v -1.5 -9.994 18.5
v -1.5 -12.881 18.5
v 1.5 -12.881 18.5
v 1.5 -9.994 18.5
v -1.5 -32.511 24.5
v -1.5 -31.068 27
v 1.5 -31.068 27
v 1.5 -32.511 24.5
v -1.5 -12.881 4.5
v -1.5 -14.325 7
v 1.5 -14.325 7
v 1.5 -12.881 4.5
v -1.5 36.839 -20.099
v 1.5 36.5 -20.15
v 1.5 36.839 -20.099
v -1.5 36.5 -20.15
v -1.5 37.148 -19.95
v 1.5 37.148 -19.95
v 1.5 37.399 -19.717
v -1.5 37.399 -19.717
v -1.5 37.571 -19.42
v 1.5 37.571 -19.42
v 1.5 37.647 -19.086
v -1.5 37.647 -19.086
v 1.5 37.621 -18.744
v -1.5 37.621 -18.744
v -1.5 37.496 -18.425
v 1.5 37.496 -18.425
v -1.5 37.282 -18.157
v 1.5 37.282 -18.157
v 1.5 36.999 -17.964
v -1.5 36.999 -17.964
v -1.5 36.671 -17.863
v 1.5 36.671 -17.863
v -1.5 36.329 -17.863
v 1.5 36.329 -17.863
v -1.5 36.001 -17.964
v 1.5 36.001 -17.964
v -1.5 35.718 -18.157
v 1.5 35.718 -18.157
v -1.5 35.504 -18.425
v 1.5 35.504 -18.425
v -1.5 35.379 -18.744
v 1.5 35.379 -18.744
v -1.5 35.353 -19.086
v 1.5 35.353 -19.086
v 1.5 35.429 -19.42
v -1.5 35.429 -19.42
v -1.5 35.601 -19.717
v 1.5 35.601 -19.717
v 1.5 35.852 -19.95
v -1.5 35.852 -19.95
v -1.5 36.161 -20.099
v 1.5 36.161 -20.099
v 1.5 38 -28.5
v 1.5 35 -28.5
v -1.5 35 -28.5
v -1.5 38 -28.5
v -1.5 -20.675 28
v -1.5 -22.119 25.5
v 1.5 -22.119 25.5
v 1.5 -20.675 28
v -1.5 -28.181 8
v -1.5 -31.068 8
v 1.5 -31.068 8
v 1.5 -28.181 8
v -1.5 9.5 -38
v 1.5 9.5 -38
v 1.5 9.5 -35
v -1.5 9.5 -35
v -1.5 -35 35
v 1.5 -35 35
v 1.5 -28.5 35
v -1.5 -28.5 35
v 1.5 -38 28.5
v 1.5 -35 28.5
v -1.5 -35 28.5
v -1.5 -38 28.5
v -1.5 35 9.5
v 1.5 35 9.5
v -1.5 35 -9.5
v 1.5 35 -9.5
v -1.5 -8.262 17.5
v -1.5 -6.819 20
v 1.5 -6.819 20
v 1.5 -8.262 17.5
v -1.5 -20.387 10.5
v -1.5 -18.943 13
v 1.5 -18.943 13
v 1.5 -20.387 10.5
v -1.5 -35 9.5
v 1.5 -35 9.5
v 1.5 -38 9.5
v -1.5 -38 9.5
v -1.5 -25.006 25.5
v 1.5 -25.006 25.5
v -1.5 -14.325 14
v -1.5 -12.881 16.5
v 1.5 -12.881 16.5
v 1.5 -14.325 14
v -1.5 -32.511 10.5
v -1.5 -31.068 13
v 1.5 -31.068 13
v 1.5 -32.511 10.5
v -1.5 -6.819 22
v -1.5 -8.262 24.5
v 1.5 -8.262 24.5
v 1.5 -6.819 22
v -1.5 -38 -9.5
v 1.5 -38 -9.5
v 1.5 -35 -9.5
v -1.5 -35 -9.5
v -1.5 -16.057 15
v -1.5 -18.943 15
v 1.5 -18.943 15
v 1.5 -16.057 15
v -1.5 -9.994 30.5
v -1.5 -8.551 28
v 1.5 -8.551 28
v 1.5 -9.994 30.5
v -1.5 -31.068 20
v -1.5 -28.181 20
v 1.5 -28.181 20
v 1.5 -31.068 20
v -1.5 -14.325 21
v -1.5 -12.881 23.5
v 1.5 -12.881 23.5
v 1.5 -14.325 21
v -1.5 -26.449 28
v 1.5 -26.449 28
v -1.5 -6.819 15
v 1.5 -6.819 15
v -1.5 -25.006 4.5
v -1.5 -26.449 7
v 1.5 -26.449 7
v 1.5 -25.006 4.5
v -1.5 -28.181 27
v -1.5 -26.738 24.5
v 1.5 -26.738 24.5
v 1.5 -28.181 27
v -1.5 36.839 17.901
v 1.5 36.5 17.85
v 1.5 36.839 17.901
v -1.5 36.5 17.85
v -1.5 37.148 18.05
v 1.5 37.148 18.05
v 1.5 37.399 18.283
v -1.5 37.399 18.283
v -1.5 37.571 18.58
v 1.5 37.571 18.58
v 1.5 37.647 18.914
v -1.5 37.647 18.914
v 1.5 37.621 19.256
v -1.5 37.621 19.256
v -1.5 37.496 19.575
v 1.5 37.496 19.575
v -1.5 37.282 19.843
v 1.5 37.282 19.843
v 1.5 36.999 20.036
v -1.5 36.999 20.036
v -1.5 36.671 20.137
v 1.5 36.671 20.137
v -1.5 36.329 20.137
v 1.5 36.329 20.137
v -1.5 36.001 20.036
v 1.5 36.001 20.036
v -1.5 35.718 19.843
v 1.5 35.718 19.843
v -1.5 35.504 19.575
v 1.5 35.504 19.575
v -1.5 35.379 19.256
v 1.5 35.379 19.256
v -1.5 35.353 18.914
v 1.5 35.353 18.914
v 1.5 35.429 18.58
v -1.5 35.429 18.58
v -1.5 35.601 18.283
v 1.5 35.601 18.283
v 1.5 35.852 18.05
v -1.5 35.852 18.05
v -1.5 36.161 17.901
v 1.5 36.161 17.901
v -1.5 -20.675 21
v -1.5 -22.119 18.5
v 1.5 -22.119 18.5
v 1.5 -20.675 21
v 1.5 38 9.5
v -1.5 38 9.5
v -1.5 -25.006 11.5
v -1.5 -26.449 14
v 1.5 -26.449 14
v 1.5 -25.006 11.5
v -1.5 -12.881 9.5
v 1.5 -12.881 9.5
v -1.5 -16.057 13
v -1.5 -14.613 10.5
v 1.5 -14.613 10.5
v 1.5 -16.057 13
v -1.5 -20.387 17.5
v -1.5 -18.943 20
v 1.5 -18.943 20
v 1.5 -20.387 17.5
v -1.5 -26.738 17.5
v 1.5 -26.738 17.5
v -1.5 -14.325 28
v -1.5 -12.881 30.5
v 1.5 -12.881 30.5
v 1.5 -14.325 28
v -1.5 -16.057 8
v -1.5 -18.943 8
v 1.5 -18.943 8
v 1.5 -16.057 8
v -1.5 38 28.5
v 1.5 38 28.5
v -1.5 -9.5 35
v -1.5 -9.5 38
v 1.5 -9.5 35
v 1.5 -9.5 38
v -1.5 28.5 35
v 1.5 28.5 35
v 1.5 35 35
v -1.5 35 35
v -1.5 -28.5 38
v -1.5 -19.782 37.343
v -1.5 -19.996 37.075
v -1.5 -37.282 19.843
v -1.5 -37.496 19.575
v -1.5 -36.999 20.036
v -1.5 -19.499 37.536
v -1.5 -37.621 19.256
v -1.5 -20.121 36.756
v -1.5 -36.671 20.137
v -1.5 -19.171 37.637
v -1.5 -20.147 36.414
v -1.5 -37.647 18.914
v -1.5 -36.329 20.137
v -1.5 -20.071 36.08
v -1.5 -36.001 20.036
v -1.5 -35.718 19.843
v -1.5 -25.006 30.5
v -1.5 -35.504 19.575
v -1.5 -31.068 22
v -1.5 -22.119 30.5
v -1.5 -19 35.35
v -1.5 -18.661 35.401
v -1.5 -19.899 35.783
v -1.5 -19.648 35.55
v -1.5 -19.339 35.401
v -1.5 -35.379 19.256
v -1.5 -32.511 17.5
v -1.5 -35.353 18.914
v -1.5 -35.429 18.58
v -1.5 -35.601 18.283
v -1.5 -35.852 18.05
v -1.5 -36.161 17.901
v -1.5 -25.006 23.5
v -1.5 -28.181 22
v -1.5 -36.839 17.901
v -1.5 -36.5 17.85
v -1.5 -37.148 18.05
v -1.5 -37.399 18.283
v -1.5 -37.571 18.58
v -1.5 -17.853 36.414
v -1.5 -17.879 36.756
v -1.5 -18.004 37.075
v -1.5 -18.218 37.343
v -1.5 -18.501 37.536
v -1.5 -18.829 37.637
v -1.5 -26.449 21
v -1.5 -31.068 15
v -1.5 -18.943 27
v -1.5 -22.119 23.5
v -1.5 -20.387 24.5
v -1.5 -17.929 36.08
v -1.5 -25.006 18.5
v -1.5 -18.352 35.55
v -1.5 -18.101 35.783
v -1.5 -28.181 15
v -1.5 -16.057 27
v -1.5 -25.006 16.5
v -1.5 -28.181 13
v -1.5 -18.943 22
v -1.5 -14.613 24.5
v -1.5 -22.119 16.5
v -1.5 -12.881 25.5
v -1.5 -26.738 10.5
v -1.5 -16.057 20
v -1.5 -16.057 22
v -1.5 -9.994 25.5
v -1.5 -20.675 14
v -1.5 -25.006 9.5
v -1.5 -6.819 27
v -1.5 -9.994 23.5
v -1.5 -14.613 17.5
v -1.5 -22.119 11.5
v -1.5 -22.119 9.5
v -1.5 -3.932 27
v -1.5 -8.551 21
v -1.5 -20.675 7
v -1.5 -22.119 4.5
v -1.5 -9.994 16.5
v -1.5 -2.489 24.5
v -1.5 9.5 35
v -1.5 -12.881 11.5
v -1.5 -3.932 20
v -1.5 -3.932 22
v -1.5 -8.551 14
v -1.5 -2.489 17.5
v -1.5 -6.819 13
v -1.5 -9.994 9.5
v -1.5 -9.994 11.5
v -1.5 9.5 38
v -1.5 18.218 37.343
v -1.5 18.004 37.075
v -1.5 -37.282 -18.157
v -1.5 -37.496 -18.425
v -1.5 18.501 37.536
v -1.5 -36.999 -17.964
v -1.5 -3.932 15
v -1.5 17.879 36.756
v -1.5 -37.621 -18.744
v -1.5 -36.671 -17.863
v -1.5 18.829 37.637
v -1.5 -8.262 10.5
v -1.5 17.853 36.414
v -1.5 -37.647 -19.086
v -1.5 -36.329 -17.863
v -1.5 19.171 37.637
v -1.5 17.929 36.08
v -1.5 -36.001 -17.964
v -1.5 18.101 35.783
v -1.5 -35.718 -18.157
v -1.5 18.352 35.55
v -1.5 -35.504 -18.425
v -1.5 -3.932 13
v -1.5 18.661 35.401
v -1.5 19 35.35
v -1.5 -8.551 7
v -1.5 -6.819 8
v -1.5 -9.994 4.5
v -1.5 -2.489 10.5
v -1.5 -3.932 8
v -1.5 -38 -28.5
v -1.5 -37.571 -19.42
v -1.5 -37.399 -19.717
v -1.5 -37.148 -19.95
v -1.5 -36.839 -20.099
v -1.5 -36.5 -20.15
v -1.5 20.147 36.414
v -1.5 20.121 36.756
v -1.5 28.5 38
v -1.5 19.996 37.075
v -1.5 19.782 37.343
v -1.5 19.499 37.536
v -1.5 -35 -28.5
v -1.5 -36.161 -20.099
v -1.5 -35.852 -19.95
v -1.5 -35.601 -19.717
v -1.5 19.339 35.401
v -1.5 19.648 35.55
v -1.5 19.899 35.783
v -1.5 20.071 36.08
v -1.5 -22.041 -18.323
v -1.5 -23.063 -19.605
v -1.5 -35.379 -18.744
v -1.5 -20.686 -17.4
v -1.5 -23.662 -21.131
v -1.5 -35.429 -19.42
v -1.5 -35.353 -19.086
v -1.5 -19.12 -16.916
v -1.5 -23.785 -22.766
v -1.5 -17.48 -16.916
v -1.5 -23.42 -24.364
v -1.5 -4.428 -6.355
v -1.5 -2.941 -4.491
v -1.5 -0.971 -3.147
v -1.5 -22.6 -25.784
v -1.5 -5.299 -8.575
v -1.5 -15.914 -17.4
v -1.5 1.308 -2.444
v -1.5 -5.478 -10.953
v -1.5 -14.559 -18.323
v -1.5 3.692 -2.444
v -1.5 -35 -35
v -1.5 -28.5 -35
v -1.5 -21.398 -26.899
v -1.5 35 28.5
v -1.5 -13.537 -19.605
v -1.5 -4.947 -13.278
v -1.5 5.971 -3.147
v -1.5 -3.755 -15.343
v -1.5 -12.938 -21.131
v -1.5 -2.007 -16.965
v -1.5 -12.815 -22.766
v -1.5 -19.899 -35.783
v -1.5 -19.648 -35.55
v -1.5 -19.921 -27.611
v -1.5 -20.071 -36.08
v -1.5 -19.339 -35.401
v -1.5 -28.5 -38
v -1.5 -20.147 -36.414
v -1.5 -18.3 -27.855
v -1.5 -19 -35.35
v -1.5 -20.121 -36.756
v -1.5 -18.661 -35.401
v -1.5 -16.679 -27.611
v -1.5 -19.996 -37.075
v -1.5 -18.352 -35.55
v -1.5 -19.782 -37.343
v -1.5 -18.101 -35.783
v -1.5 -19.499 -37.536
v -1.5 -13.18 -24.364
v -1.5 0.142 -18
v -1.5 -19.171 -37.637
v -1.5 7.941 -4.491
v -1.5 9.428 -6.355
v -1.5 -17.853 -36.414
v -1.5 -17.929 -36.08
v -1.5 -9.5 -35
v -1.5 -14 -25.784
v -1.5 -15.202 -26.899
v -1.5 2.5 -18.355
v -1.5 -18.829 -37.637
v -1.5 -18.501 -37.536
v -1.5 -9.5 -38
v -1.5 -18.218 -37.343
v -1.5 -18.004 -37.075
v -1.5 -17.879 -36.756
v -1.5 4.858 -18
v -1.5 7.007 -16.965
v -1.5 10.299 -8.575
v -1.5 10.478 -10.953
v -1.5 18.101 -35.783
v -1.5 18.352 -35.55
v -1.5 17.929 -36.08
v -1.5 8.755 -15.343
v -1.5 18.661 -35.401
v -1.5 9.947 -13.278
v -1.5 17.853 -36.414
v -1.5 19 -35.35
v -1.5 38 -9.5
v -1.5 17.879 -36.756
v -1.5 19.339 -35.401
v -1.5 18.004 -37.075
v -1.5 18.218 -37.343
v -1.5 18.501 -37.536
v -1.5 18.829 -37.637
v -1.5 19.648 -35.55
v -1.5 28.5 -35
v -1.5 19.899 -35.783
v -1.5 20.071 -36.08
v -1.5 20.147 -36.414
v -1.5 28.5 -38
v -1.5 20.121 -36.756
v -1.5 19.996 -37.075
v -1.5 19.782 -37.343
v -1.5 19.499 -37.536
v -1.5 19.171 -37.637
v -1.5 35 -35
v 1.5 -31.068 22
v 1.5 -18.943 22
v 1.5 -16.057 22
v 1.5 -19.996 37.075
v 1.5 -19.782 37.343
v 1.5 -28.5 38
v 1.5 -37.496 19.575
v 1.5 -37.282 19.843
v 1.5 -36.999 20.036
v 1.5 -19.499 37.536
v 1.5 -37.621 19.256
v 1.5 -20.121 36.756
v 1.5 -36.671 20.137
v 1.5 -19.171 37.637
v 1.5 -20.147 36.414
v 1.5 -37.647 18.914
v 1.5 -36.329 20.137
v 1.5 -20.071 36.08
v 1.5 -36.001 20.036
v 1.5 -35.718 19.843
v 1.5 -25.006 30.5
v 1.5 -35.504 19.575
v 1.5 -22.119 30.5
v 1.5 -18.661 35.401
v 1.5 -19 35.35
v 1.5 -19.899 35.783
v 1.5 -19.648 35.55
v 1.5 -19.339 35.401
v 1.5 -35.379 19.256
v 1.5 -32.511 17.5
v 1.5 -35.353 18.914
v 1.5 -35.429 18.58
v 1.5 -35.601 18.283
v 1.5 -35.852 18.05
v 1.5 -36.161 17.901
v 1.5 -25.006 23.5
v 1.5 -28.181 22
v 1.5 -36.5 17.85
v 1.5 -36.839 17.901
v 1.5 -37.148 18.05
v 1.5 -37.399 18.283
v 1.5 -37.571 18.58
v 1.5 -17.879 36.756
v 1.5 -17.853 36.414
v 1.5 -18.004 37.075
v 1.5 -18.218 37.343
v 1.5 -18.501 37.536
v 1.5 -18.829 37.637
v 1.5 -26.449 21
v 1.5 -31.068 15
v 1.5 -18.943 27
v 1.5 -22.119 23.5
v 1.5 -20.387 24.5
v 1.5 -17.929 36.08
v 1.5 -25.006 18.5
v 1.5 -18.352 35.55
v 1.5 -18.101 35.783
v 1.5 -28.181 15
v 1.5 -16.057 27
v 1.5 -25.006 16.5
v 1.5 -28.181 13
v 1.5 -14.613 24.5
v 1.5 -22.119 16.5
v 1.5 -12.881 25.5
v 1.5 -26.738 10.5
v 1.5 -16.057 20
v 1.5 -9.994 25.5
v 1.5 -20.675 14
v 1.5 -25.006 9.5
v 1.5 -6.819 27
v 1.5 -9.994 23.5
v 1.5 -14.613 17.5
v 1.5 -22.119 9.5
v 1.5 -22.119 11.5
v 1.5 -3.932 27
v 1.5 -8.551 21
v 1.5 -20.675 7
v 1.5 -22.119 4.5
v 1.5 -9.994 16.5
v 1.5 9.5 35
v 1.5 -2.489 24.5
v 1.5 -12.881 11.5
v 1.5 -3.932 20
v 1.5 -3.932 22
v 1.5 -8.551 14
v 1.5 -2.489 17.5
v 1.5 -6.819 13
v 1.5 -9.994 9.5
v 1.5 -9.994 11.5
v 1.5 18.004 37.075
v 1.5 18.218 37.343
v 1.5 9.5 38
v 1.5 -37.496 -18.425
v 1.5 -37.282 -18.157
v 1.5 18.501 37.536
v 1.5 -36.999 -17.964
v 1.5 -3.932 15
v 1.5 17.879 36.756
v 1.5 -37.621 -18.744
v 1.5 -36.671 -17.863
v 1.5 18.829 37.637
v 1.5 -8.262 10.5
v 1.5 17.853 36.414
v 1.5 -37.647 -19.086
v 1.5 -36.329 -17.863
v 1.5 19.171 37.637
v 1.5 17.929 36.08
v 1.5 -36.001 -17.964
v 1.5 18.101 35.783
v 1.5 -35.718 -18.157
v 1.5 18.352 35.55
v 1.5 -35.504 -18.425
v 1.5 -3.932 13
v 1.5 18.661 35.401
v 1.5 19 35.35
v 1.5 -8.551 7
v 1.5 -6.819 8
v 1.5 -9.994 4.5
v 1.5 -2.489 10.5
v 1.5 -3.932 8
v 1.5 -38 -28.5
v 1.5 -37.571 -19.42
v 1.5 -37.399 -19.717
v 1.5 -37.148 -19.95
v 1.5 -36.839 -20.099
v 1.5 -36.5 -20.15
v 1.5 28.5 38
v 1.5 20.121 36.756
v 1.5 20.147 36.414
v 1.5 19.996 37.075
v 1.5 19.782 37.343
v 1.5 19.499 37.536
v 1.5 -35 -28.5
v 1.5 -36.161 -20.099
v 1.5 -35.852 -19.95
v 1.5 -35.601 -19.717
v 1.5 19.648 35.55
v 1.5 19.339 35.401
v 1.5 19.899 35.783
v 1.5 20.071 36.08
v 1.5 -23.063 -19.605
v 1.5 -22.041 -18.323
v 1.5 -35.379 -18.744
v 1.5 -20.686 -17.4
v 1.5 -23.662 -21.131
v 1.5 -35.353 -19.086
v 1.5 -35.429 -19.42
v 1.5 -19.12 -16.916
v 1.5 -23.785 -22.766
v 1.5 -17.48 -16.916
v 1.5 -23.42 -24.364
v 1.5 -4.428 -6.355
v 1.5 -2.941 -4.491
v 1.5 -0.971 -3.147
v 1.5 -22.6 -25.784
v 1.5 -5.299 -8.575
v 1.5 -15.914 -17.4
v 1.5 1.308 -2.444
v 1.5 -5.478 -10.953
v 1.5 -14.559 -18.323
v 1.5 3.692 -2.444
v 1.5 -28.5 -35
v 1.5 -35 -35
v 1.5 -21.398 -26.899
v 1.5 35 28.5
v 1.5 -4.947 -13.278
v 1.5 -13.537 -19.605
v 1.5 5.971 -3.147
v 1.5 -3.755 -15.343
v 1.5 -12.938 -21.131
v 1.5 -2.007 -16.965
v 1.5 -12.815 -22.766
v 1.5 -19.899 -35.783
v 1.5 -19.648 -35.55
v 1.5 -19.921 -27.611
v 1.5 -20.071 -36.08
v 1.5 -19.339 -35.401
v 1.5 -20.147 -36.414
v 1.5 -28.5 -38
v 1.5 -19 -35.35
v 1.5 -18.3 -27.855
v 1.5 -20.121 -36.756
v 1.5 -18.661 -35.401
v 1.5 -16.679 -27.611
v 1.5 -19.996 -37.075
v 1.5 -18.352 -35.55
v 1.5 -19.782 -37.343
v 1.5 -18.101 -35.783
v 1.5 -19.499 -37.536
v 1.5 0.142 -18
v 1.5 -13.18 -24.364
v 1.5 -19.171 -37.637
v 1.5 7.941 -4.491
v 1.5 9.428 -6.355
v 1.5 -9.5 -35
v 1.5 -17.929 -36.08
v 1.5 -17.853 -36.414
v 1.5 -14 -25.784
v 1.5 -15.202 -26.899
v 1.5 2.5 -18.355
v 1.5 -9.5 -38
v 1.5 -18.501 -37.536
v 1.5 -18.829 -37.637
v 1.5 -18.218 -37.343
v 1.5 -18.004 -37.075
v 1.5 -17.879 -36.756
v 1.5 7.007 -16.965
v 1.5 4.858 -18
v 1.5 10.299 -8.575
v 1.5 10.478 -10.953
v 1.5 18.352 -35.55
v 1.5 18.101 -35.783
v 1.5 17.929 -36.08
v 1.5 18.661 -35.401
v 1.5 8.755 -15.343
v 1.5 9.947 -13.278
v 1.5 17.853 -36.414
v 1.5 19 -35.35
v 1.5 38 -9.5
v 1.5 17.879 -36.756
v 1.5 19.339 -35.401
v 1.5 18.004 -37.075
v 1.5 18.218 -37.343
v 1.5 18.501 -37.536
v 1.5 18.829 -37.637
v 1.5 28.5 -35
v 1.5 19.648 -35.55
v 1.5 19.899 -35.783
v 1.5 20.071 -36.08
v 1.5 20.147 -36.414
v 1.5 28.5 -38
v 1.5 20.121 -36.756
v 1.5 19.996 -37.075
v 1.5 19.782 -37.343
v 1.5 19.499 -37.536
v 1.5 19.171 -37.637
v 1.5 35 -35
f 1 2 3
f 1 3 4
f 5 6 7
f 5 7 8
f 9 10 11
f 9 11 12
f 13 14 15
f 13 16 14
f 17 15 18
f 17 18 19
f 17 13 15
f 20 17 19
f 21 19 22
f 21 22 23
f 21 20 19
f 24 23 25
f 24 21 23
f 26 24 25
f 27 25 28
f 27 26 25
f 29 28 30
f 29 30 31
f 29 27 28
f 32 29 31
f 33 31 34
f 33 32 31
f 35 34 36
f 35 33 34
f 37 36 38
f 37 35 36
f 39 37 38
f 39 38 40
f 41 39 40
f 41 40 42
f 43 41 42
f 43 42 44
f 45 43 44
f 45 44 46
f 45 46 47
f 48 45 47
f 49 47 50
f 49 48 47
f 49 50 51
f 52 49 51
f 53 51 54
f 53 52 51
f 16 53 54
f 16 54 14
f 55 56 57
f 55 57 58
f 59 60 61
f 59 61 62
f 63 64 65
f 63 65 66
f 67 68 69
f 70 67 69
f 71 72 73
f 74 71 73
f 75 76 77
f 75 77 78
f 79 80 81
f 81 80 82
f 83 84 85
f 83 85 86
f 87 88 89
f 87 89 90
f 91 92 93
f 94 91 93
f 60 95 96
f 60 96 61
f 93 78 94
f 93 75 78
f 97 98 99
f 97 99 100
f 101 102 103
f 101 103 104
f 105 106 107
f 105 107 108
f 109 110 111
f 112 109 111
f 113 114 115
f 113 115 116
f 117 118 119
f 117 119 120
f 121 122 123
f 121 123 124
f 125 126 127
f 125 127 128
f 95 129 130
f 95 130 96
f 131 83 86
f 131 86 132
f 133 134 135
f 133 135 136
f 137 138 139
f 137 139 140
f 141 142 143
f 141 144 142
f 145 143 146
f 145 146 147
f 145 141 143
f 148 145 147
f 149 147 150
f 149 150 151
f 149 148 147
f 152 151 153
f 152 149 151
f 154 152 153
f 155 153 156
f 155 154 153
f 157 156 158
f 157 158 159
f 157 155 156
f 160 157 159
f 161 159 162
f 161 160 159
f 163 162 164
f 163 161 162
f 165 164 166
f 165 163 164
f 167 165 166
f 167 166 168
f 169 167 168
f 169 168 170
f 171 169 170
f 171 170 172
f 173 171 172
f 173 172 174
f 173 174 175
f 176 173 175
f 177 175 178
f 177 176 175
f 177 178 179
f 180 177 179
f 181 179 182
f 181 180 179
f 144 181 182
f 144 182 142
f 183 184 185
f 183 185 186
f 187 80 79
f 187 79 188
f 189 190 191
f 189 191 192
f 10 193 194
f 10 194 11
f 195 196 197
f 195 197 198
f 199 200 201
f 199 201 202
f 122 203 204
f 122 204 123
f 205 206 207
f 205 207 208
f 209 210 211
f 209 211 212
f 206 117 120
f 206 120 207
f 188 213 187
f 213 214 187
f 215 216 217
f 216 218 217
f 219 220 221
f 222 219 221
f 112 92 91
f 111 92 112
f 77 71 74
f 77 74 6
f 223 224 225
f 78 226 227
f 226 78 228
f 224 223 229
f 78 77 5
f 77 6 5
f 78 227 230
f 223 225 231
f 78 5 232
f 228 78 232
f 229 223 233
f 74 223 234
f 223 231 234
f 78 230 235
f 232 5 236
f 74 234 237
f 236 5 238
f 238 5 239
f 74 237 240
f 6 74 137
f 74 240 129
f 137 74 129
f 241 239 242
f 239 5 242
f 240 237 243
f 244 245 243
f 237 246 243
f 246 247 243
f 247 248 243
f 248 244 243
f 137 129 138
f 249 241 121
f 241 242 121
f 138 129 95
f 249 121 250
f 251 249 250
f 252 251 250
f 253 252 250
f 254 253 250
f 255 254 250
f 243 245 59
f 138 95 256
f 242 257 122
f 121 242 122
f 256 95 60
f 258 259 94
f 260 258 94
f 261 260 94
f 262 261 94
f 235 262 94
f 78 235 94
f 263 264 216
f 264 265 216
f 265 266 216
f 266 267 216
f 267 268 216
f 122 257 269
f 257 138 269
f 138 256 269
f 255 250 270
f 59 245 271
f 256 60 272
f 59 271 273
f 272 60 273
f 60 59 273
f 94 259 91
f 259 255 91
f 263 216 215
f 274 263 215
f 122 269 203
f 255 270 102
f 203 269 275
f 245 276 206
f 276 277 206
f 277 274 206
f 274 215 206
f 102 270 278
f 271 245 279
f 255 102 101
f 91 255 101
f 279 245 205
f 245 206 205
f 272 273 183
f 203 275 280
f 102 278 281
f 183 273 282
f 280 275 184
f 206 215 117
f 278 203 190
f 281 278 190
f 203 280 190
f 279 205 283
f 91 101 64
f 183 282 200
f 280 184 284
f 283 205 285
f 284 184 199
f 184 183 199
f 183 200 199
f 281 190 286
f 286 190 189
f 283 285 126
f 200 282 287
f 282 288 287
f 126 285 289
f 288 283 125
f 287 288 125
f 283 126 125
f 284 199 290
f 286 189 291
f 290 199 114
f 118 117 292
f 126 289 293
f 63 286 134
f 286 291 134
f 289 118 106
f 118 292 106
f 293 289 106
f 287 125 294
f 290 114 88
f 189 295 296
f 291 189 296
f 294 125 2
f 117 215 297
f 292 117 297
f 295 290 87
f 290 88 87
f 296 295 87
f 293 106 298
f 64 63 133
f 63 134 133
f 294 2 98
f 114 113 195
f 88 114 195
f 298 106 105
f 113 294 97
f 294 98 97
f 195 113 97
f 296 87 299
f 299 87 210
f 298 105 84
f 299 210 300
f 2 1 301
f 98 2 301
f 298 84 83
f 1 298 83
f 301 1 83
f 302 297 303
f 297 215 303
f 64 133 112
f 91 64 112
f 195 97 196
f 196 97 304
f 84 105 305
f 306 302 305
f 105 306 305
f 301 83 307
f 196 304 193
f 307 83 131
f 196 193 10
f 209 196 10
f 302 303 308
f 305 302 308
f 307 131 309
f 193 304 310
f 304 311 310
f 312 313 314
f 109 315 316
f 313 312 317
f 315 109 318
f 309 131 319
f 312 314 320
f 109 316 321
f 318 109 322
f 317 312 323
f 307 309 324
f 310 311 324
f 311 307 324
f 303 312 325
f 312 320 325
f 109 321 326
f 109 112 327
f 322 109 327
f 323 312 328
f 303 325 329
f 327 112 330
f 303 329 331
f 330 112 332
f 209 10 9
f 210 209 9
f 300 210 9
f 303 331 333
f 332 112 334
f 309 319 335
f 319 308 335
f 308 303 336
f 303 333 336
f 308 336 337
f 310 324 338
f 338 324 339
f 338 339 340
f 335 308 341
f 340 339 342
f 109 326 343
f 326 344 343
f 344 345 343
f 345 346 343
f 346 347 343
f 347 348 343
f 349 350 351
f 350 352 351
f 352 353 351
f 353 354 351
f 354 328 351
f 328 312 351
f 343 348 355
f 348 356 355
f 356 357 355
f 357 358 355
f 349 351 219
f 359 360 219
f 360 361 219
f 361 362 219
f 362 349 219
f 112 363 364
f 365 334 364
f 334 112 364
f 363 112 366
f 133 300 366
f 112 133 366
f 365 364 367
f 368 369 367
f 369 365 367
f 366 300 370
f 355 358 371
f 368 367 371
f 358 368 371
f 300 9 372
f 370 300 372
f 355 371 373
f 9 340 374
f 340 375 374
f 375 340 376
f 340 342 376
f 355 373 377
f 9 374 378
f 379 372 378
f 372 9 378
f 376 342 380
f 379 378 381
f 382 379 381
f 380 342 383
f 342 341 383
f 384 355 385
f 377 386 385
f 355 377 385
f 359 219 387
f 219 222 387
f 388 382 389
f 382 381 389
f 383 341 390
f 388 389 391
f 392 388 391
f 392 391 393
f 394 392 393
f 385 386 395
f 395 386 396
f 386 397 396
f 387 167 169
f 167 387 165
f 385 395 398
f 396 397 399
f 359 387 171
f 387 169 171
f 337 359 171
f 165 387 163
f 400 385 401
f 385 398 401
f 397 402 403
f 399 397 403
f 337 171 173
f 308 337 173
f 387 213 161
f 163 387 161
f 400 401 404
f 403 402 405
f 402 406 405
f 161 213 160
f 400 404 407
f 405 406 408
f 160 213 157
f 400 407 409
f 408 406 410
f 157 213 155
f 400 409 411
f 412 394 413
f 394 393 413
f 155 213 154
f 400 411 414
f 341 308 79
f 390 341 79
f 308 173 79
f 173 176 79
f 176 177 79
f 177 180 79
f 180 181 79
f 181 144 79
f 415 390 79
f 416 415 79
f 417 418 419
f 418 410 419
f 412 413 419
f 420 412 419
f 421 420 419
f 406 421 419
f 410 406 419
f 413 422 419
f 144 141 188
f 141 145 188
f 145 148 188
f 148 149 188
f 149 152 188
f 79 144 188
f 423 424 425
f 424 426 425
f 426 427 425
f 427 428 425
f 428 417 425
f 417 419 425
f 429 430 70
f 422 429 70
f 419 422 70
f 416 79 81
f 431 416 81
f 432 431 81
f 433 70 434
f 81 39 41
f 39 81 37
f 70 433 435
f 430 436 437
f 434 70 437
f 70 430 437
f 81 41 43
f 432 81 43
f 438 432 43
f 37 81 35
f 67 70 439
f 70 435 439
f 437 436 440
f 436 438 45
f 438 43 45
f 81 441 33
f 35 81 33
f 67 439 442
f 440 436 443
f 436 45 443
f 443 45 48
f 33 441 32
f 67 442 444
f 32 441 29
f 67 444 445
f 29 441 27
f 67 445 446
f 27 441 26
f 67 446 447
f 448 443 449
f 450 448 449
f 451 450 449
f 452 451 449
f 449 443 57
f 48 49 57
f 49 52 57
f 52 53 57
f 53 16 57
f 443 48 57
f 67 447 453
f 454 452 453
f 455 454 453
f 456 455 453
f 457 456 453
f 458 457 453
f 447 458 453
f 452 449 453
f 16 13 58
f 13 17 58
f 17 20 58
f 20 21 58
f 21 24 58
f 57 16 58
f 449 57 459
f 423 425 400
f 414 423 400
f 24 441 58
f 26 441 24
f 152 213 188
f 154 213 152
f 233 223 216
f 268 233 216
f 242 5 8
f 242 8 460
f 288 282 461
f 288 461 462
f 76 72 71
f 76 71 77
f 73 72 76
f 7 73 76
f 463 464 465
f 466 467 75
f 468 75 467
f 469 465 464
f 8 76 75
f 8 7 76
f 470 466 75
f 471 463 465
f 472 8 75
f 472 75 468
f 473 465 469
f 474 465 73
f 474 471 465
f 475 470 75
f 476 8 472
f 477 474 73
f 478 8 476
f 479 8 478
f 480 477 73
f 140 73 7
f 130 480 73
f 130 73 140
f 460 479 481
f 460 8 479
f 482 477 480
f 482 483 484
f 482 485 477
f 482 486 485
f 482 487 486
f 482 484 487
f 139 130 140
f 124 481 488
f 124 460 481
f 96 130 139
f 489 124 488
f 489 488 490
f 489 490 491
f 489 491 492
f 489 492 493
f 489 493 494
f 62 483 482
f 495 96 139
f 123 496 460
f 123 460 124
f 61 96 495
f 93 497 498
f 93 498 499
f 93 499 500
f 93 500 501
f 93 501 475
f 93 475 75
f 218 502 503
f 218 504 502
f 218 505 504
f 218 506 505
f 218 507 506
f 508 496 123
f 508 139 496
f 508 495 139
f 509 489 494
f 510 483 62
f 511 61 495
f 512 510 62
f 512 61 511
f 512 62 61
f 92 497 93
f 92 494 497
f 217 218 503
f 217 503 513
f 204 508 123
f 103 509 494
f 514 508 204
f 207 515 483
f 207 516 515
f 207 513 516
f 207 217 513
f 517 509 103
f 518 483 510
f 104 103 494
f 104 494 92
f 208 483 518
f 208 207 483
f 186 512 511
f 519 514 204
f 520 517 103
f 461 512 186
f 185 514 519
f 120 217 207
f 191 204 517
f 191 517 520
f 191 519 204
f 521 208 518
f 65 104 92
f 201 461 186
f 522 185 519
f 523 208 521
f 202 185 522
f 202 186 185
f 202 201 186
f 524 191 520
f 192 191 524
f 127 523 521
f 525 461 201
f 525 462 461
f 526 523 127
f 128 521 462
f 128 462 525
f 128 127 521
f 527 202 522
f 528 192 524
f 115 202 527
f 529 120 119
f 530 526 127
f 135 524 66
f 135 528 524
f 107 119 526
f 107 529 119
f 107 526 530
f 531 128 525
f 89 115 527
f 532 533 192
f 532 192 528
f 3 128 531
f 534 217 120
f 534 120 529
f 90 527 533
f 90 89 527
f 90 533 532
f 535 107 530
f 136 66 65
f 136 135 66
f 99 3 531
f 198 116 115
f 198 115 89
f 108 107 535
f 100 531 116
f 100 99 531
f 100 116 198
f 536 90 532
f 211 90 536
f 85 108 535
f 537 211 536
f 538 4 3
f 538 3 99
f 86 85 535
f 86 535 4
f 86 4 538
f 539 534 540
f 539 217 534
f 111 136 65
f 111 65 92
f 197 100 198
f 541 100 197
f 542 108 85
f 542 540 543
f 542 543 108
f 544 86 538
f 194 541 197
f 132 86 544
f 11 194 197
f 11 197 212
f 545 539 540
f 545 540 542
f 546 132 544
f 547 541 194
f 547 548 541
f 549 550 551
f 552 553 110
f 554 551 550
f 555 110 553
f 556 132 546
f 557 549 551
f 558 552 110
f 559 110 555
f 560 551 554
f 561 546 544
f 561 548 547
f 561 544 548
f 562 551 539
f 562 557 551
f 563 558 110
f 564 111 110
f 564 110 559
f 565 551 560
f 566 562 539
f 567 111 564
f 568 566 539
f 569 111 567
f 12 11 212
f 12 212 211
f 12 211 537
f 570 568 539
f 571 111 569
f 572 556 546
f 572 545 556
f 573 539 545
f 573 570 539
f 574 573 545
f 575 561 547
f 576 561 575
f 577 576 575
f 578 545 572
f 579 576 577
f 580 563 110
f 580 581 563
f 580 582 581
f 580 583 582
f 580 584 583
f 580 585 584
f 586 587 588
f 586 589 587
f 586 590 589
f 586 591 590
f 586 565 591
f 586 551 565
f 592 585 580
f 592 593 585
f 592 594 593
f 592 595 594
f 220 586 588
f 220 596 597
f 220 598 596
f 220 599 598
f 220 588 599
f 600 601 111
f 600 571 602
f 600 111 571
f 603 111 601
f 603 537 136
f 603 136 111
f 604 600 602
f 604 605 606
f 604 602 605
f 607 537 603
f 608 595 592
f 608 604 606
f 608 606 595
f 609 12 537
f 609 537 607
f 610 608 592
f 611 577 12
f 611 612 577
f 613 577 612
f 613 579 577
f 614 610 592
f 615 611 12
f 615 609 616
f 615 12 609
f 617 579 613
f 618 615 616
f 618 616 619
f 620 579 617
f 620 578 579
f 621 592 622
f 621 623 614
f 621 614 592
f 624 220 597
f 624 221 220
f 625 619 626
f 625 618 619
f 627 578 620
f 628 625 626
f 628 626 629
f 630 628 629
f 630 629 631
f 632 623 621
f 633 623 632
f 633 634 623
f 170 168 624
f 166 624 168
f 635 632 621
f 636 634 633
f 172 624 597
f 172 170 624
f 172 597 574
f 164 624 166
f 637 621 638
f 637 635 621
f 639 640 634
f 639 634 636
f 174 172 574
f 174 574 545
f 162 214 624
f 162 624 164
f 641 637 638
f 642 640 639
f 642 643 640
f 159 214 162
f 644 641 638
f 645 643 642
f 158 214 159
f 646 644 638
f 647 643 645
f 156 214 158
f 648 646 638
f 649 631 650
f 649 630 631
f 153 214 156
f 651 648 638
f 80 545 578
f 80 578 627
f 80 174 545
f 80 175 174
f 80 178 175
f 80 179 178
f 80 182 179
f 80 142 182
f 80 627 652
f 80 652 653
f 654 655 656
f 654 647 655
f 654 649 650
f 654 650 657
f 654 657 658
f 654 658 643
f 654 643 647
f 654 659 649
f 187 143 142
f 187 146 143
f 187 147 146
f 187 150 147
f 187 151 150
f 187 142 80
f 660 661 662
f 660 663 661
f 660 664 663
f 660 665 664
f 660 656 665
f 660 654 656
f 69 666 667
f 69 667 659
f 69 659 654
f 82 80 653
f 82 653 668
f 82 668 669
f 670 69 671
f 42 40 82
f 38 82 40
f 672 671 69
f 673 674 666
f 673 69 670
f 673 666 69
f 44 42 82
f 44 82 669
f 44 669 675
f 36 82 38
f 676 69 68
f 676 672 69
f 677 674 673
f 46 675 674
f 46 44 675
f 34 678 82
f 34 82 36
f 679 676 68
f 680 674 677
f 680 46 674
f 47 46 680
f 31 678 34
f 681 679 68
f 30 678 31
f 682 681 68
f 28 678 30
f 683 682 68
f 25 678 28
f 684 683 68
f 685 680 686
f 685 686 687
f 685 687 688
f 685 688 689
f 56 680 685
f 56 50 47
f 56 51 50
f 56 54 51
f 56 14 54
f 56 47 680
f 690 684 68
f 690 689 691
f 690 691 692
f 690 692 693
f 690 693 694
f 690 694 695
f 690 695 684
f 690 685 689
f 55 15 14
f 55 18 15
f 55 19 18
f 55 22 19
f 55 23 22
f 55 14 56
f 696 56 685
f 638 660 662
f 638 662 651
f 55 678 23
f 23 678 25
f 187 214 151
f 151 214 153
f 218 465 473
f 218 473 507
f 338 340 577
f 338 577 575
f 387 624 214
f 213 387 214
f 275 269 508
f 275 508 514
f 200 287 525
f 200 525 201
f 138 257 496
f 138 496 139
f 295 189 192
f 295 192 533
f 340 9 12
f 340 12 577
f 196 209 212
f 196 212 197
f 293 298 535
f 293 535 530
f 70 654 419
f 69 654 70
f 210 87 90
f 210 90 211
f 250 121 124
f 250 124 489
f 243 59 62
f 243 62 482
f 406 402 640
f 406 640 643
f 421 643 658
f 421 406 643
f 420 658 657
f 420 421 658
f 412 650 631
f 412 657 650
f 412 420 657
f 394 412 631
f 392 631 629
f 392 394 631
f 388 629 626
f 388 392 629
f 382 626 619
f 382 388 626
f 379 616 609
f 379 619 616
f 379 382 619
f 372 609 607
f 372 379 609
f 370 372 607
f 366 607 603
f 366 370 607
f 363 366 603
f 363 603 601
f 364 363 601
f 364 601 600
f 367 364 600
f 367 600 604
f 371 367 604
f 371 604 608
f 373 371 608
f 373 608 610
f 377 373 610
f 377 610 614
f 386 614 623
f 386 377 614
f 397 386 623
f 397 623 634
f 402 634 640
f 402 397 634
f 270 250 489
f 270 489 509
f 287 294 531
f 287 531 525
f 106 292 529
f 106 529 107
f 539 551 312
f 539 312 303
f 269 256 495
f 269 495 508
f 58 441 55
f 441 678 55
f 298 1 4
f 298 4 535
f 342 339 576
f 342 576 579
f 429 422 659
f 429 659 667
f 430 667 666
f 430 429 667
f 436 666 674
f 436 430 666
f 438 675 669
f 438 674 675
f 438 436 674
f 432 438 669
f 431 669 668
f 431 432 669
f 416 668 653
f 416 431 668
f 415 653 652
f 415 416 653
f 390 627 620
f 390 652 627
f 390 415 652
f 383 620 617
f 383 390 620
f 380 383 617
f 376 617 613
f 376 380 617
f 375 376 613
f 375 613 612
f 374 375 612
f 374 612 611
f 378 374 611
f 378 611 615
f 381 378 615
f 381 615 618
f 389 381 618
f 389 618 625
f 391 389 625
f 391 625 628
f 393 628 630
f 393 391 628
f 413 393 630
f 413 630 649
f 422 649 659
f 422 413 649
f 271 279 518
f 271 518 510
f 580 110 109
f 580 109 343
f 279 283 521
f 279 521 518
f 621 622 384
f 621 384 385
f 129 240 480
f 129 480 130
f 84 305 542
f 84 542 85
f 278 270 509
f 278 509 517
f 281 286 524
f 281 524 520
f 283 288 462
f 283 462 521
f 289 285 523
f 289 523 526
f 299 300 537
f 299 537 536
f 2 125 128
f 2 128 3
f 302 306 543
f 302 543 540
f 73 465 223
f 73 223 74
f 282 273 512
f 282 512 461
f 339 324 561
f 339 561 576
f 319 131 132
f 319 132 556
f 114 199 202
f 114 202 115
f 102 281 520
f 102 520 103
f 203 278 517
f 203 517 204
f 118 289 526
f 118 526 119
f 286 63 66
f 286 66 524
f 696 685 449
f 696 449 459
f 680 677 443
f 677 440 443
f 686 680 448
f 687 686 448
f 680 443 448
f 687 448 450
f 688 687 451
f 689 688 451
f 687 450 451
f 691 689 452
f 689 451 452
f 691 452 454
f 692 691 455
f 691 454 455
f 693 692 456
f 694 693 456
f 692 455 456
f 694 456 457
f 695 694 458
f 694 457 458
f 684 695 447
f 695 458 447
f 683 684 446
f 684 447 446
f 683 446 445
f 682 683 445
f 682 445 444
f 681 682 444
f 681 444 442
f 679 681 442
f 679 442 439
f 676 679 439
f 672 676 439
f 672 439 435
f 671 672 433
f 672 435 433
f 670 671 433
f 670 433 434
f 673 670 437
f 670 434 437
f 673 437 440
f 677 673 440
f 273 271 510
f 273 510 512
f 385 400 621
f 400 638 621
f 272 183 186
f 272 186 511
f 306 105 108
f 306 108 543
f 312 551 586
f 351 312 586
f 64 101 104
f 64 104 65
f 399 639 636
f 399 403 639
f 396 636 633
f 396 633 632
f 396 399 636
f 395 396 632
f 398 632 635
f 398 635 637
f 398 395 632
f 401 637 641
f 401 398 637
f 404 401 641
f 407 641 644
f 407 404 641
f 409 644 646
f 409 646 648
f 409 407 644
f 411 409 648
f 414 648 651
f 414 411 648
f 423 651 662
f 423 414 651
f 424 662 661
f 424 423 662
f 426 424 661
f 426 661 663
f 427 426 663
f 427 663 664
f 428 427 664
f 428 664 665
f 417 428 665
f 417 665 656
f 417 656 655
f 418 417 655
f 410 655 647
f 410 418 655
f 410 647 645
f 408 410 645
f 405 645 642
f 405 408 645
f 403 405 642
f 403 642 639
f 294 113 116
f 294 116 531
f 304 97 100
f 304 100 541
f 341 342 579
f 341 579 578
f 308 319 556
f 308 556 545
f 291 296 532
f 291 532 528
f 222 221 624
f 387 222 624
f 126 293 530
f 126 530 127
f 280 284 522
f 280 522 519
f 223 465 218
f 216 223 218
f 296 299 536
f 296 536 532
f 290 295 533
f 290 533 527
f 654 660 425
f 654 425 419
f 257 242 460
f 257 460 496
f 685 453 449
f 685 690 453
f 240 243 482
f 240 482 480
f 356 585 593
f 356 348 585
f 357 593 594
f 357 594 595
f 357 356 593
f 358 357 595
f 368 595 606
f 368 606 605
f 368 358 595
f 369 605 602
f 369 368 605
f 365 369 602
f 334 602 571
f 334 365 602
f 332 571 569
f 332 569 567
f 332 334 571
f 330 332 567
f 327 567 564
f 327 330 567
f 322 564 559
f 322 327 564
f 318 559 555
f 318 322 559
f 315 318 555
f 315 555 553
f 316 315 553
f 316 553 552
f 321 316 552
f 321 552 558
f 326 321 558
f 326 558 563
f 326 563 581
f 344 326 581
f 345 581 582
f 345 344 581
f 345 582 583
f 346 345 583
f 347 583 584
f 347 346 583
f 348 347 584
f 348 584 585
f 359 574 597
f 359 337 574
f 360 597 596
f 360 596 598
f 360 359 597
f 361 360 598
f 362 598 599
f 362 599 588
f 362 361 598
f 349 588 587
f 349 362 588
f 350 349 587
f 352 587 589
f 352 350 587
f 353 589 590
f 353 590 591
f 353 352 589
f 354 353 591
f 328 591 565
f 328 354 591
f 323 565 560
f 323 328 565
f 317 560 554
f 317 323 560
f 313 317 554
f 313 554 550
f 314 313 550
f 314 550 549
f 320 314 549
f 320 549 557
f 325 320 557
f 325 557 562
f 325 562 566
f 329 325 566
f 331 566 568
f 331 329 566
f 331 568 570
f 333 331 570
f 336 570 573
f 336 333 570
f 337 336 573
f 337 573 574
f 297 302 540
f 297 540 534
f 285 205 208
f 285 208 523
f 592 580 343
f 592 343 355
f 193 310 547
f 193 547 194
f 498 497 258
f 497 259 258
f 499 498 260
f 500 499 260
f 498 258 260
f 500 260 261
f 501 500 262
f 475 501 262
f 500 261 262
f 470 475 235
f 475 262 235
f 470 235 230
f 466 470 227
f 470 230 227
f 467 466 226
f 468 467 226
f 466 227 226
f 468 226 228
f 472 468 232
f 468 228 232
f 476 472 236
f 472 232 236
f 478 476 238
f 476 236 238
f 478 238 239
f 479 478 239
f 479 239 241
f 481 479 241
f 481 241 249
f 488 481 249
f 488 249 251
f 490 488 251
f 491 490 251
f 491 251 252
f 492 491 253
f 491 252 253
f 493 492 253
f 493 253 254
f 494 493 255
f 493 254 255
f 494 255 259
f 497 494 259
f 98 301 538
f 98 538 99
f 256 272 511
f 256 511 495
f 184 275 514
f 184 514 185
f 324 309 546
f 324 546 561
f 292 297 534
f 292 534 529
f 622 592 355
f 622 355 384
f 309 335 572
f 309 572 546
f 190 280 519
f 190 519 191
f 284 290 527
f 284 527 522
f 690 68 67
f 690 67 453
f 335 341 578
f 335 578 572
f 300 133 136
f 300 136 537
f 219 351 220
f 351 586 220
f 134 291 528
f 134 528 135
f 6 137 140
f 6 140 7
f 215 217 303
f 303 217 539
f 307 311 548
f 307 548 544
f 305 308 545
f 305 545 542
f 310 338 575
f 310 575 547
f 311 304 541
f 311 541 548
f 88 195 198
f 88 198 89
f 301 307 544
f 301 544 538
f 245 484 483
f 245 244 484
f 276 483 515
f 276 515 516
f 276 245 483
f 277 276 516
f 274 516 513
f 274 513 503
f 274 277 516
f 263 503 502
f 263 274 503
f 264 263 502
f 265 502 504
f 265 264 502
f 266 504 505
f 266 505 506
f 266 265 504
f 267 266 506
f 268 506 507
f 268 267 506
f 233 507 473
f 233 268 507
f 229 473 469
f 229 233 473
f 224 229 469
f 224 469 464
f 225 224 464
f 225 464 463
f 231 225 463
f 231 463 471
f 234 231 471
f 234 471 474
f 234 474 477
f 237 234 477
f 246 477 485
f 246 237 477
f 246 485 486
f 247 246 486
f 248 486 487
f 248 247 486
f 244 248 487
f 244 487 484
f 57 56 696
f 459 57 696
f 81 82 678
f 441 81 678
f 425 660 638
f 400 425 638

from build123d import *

# Parameters (mm, degrees)
CROQUIS1_W                 = 70
CROQUIS1_H                 = 70
SALIENTE_EXTRUIR1_DEPTH    = 1.5
CROQUIS2_W                 = 19
CROQUIS2_H                 = 3
CROQUIS2_R                 = 1.15
SALIENTE_EXTRUIR2_DEPTH    = 1.5
MATRIZL1_COUNT             = 2
MATRIZL1_PITCH             = 38
SIMETR_A1_COPY_1_SKETCH_W  = 19
SIMETR_A1_COPY_1_SKETCH_H  = 3
SIMETR_A1_COPY_1_SKETCH_R  = 1.15
SIMETR_A1_COPY_1_DEPTH     = 1.5
CROQUIS5_W                 = 3
CROQUIS5_H                 = 19
CROQUIS5_R                 = 1.15
SALIENTE_EXTRUIR3_DEPTH    = 1.5
MATRIZL2_COUNT             = 2
MATRIZL2_PITCH             = 38
SIMETR_A2_COPY_1_SKETCH_W  = 3
SIMETR_A2_COPY_1_SKETCH_H  = 19
SIMETR_A2_COPY_1_SKETCH_R  = 1.15
SIMETR_A2_COPY_1_DEPTH     = 1.5
CORTAR_EXTRUIR2_DEPTH      = 54.761045377
CORTAR_EXTRUIR2_DEPTH_BACK = 54.761045377
CROQUIS4_R                 = 5.5
CORTAR_EXTRUIR3_DEPTH      = 54.761045377
CORTAR_EXTRUIR3_DEPTH_BACK = 54.761045377
CROQUIS6_R                 = 8
CORTAR_EXTRUIR7_DEPTH      = 54.761045377
CORTAR_EXTRUIR7_DEPTH_BACK = 54.761045377
PATR_N_START               = -1.5
PATR_N_DE_RAYADO3_DEPTH    = 3


# Read off the part's stored shape, not the designer's step: Patrón de rayado3
with BuildPart() as part:
    # Croquis1 → Saliente-Extruir1 (new, symmetric)
    with BuildSketch(Plane(origin=(0, 0, 0), x_dir=(0, 0, -1), z_dir=(1, 0, 0))):
        Rectangle(CROQUIS1_W, CROQUIS1_H)
    extrude(amount=SALIENTE_EXTRUIR1_DEPTH, both=True)

    # Croquis2 → Saliente-Extruir2 (add, symmetric)
    with BuildSketch(Plane(origin=(0, 0, 0), x_dir=(0, 0, -1), z_dir=(1, 0, 0))):
        with Locations((-19, 36.5)):
            Rectangle(CROQUIS2_W, CROQUIS2_H)
        with Locations((-19, 36.5)):
            Circle(CROQUIS2_R, mode=Mode.SUBTRACT)
    saliente_extruir2 = extrude(amount=SALIENTE_EXTRUIR2_DEPTH, both=True)

    # MatrizL1: Saliente-Extruir2 ×2
    with Locations(*[(0, 0, -i * MATRIZL1_PITCH) for i in range(1, MATRIZL1_COUNT)]):
        add(saliente_extruir2)

    # Simetría1: Saliente-Extruir2 across plane
    add(saliente_extruir2.mirror(Plane.ZX))

    # Simetría1 copy 1 sketch → Simetría1 copy 1 (add, symmetric)
    with BuildSketch(Plane(origin=(0, 0, -38), x_dir=(0, 0, -1), z_dir=(1, 0, 0))):
        with Locations((-19, -36.5)):
            Rectangle(SIMETR_A1_COPY_1_SKETCH_W, SIMETR_A1_COPY_1_SKETCH_H)
        with Locations((-19, -36.5)):
            Circle(SIMETR_A1_COPY_1_SKETCH_R, mode=Mode.SUBTRACT)
    extrude(amount=SIMETR_A1_COPY_1_DEPTH, both=True)

    # Croquis5 → Saliente-Extruir3 (add, symmetric)
    with BuildSketch(Plane(origin=(0, 0, 0), x_dir=(0, 0, -1), z_dir=(1, 0, 0))):
        with Locations((-36.5, 19)):
            Rectangle(CROQUIS5_W, CROQUIS5_H)
        with Locations((-36.5, 19)):
            Circle(CROQUIS5_R, mode=Mode.SUBTRACT)
    saliente_extruir3 = extrude(amount=SALIENTE_EXTRUIR3_DEPTH, both=True)

    # MatrizL2: Saliente-Extruir3 ×2
    with Locations(*[(0, -i * MATRIZL2_PITCH, 0) for i in range(1, MATRIZL2_COUNT)]):
        add(saliente_extruir3)

    # Simetría2: Saliente-Extruir3 across plane
    add(saliente_extruir3.mirror(Plane.XY))

    # Simetría2 copy 1 sketch → Simetría2 copy 1 (add, symmetric)
    with BuildSketch(Plane(origin=(0, -38, 0), x_dir=(0, 0, 1), z_dir=(1, 0, 0))):
        with Locations((-36.5, -19)):
            Rectangle(SIMETR_A2_COPY_1_SKETCH_W, SIMETR_A2_COPY_1_SKETCH_H)
        with Locations((-36.5, -19)):
            Circle(SIMETR_A2_COPY_1_SKETCH_R, mode=Mode.SUBTRACT)
    extrude(amount=SIMETR_A2_COPY_1_DEPTH, both=True)

    # Croquis4 → Cortar-Extruir2 (cut, two sides: drawn at the far end of the back side and taken through both)
    with BuildSketch(Plane(origin=(0, 0, 0), x_dir=(0, 0, -1), z_dir=(1, 0, 0)).offset(-CORTAR_EXTRUIR2_DEPTH_BACK)):
        with Locations((22.355, -18.3)):
            Circle(CROQUIS4_R)
    extrude(amount=CORTAR_EXTRUIR2_DEPTH + CORTAR_EXTRUIR2_DEPTH_BACK, mode=Mode.SUBTRACT)

    # Croquis6 → Cortar-Extruir3 (cut, two sides: drawn at the far end of the back side and taken through both)
    with BuildSketch(Plane(origin=(0, 0, 0), x_dir=(0, 0, -1), z_dir=(1, 0, 0)).offset(-CORTAR_EXTRUIR3_DEPTH_BACK)):
        with Locations((10.355, 2.5)):
            Circle(CROQUIS6_R)
    extrude(amount=CORTAR_EXTRUIR3_DEPTH + CORTAR_EXTRUIR3_DEPTH_BACK, mode=Mode.SUBTRACT)

    # Croquis11 → Cortar-Extruir7 (cut, two sides: drawn at the far end of the back side and taken through both)
    with BuildSketch(Plane(origin=(0, 0, 0), x_dir=(0, 0, -1), z_dir=(1, 0, 0)).offset(-CORTAR_EXTRUIR7_DEPTH_BACK)):
        Polygon((-20, -16.056624327), (-20, -18.943375673), (-17.5, -20.386751346), (-15, -18.943375673), (-15, -16.056624327), (-17.5, -14.613248654), align=None)
    extrude(amount=CORTAR_EXTRUIR7_DEPTH + CORTAR_EXTRUIR7_DEPTH_BACK, mode=Mode.SUBTRACT)

    # Patrón de rayado3 outline → Patrón de rayado3 (cut)
    with BuildSketch(Plane.YZ.offset(PATR_N_START)):
        Polygon((-20.675426481, 7), (-22.118802154, 9.5), (-25.005553499, 9.5), (-26.448929172, 7), (-25.005553499, 4.5), (-22.118802154, 4.5), align=None)
        Polygon((-8.551070828, 7), (-9.994446501, 9.5), (-12.881197846, 9.5), (-14.324573519, 7), (-12.881197846, 4.5), (-9.994446501, 4.5), align=None)
        Polygon((-22.118802154, 25.5), (-20.675426481, 28), (-22.118802154, 30.5), (-25.005553499, 30.5), (-26.448929172, 28), (-25.005553499, 25.5), align=None)
        Polygon((-12.881197846, 25.5), (-9.994446501, 25.5), (-8.551070828, 28), (-9.994446501, 30.5), (-12.881197846, 30.5), (-14.324573519, 28), align=None)
        Polygon((-32.511106999, 17.5), (-31.067731326, 15), (-28.18097998, 15), (-26.737604307, 17.5), (-28.18097998, 20), (-31.067731326, 20), align=None)
        Polygon((-8.262395693, 17.5), (-6.81902002, 15), (-3.932268674, 15), (-2.488893001, 17.5), (-3.932268674, 20), (-6.81902002, 20), align=None)
        Polygon((-16.056624327, 8), (-14.613248654, 10.5), (-16.056624327, 13), (-18.943375673, 13), (-20.386751346, 10.5), (-18.943375673, 8), align=None)
        Polygon((-22.118802154, 18.5), (-20.675426481, 21), (-22.118802154, 23.5), (-25.005553499, 23.5), (-26.448929172, 21), (-25.005553499, 18.5), align=None)
        Polygon((-12.881197846, 18.5), (-9.994446501, 18.5), (-8.551070828, 21), (-9.994446501, 23.5), (-12.881197846, 23.5), (-14.324573519, 21), align=None)
        Polygon((-8.262395693, 10.5), (-6.81902002, 8), (-3.932268674, 8), (-2.488893001, 10.5), (-3.932268674, 13), (-6.81902002, 13), align=None)
        Polygon((-32.511106999, 10.5), (-31.067731326, 8), (-28.18097998, 8), (-26.737604307, 10.5), (-28.18097998, 13), (-31.067731326, 13), align=None)
        Polygon((-22.118802154, 11.5), (-20.675426481, 14), (-22.118802154, 16.5), (-25.005553499, 16.5), (-26.448929172, 14), (-25.005553499, 11.5), align=None)
        Polygon((-28.18097998, 22), (-26.737604307, 24.5), (-28.18097998, 27), (-31.067731326, 27), (-32.511106999, 24.5), (-31.067731326, 22), align=None)
        Polygon((-18.943375673, 22), (-16.056624327, 22), (-14.613248654, 24.5), (-16.056624327, 27), (-18.943375673, 27), (-20.386751346, 24.5), align=None)
        Polygon((-14.324573519, 14), (-12.881197846, 11.5), (-9.994446501, 11.5), (-8.551070828, 14), (-9.994446501, 16.5), (-12.881197846, 16.5), align=None)
        Polygon((-8.262395693, 24.5), (-6.81902002, 22), (-3.932268674, 22), (-2.488893001, 24.5), (-3.932268674, 27), (-6.81902002, 27), align=None)
    extrude(amount=PATR_N_DE_RAYADO3_DEPTH, mode=Mode.SUBTRACT)


solid = part.part
